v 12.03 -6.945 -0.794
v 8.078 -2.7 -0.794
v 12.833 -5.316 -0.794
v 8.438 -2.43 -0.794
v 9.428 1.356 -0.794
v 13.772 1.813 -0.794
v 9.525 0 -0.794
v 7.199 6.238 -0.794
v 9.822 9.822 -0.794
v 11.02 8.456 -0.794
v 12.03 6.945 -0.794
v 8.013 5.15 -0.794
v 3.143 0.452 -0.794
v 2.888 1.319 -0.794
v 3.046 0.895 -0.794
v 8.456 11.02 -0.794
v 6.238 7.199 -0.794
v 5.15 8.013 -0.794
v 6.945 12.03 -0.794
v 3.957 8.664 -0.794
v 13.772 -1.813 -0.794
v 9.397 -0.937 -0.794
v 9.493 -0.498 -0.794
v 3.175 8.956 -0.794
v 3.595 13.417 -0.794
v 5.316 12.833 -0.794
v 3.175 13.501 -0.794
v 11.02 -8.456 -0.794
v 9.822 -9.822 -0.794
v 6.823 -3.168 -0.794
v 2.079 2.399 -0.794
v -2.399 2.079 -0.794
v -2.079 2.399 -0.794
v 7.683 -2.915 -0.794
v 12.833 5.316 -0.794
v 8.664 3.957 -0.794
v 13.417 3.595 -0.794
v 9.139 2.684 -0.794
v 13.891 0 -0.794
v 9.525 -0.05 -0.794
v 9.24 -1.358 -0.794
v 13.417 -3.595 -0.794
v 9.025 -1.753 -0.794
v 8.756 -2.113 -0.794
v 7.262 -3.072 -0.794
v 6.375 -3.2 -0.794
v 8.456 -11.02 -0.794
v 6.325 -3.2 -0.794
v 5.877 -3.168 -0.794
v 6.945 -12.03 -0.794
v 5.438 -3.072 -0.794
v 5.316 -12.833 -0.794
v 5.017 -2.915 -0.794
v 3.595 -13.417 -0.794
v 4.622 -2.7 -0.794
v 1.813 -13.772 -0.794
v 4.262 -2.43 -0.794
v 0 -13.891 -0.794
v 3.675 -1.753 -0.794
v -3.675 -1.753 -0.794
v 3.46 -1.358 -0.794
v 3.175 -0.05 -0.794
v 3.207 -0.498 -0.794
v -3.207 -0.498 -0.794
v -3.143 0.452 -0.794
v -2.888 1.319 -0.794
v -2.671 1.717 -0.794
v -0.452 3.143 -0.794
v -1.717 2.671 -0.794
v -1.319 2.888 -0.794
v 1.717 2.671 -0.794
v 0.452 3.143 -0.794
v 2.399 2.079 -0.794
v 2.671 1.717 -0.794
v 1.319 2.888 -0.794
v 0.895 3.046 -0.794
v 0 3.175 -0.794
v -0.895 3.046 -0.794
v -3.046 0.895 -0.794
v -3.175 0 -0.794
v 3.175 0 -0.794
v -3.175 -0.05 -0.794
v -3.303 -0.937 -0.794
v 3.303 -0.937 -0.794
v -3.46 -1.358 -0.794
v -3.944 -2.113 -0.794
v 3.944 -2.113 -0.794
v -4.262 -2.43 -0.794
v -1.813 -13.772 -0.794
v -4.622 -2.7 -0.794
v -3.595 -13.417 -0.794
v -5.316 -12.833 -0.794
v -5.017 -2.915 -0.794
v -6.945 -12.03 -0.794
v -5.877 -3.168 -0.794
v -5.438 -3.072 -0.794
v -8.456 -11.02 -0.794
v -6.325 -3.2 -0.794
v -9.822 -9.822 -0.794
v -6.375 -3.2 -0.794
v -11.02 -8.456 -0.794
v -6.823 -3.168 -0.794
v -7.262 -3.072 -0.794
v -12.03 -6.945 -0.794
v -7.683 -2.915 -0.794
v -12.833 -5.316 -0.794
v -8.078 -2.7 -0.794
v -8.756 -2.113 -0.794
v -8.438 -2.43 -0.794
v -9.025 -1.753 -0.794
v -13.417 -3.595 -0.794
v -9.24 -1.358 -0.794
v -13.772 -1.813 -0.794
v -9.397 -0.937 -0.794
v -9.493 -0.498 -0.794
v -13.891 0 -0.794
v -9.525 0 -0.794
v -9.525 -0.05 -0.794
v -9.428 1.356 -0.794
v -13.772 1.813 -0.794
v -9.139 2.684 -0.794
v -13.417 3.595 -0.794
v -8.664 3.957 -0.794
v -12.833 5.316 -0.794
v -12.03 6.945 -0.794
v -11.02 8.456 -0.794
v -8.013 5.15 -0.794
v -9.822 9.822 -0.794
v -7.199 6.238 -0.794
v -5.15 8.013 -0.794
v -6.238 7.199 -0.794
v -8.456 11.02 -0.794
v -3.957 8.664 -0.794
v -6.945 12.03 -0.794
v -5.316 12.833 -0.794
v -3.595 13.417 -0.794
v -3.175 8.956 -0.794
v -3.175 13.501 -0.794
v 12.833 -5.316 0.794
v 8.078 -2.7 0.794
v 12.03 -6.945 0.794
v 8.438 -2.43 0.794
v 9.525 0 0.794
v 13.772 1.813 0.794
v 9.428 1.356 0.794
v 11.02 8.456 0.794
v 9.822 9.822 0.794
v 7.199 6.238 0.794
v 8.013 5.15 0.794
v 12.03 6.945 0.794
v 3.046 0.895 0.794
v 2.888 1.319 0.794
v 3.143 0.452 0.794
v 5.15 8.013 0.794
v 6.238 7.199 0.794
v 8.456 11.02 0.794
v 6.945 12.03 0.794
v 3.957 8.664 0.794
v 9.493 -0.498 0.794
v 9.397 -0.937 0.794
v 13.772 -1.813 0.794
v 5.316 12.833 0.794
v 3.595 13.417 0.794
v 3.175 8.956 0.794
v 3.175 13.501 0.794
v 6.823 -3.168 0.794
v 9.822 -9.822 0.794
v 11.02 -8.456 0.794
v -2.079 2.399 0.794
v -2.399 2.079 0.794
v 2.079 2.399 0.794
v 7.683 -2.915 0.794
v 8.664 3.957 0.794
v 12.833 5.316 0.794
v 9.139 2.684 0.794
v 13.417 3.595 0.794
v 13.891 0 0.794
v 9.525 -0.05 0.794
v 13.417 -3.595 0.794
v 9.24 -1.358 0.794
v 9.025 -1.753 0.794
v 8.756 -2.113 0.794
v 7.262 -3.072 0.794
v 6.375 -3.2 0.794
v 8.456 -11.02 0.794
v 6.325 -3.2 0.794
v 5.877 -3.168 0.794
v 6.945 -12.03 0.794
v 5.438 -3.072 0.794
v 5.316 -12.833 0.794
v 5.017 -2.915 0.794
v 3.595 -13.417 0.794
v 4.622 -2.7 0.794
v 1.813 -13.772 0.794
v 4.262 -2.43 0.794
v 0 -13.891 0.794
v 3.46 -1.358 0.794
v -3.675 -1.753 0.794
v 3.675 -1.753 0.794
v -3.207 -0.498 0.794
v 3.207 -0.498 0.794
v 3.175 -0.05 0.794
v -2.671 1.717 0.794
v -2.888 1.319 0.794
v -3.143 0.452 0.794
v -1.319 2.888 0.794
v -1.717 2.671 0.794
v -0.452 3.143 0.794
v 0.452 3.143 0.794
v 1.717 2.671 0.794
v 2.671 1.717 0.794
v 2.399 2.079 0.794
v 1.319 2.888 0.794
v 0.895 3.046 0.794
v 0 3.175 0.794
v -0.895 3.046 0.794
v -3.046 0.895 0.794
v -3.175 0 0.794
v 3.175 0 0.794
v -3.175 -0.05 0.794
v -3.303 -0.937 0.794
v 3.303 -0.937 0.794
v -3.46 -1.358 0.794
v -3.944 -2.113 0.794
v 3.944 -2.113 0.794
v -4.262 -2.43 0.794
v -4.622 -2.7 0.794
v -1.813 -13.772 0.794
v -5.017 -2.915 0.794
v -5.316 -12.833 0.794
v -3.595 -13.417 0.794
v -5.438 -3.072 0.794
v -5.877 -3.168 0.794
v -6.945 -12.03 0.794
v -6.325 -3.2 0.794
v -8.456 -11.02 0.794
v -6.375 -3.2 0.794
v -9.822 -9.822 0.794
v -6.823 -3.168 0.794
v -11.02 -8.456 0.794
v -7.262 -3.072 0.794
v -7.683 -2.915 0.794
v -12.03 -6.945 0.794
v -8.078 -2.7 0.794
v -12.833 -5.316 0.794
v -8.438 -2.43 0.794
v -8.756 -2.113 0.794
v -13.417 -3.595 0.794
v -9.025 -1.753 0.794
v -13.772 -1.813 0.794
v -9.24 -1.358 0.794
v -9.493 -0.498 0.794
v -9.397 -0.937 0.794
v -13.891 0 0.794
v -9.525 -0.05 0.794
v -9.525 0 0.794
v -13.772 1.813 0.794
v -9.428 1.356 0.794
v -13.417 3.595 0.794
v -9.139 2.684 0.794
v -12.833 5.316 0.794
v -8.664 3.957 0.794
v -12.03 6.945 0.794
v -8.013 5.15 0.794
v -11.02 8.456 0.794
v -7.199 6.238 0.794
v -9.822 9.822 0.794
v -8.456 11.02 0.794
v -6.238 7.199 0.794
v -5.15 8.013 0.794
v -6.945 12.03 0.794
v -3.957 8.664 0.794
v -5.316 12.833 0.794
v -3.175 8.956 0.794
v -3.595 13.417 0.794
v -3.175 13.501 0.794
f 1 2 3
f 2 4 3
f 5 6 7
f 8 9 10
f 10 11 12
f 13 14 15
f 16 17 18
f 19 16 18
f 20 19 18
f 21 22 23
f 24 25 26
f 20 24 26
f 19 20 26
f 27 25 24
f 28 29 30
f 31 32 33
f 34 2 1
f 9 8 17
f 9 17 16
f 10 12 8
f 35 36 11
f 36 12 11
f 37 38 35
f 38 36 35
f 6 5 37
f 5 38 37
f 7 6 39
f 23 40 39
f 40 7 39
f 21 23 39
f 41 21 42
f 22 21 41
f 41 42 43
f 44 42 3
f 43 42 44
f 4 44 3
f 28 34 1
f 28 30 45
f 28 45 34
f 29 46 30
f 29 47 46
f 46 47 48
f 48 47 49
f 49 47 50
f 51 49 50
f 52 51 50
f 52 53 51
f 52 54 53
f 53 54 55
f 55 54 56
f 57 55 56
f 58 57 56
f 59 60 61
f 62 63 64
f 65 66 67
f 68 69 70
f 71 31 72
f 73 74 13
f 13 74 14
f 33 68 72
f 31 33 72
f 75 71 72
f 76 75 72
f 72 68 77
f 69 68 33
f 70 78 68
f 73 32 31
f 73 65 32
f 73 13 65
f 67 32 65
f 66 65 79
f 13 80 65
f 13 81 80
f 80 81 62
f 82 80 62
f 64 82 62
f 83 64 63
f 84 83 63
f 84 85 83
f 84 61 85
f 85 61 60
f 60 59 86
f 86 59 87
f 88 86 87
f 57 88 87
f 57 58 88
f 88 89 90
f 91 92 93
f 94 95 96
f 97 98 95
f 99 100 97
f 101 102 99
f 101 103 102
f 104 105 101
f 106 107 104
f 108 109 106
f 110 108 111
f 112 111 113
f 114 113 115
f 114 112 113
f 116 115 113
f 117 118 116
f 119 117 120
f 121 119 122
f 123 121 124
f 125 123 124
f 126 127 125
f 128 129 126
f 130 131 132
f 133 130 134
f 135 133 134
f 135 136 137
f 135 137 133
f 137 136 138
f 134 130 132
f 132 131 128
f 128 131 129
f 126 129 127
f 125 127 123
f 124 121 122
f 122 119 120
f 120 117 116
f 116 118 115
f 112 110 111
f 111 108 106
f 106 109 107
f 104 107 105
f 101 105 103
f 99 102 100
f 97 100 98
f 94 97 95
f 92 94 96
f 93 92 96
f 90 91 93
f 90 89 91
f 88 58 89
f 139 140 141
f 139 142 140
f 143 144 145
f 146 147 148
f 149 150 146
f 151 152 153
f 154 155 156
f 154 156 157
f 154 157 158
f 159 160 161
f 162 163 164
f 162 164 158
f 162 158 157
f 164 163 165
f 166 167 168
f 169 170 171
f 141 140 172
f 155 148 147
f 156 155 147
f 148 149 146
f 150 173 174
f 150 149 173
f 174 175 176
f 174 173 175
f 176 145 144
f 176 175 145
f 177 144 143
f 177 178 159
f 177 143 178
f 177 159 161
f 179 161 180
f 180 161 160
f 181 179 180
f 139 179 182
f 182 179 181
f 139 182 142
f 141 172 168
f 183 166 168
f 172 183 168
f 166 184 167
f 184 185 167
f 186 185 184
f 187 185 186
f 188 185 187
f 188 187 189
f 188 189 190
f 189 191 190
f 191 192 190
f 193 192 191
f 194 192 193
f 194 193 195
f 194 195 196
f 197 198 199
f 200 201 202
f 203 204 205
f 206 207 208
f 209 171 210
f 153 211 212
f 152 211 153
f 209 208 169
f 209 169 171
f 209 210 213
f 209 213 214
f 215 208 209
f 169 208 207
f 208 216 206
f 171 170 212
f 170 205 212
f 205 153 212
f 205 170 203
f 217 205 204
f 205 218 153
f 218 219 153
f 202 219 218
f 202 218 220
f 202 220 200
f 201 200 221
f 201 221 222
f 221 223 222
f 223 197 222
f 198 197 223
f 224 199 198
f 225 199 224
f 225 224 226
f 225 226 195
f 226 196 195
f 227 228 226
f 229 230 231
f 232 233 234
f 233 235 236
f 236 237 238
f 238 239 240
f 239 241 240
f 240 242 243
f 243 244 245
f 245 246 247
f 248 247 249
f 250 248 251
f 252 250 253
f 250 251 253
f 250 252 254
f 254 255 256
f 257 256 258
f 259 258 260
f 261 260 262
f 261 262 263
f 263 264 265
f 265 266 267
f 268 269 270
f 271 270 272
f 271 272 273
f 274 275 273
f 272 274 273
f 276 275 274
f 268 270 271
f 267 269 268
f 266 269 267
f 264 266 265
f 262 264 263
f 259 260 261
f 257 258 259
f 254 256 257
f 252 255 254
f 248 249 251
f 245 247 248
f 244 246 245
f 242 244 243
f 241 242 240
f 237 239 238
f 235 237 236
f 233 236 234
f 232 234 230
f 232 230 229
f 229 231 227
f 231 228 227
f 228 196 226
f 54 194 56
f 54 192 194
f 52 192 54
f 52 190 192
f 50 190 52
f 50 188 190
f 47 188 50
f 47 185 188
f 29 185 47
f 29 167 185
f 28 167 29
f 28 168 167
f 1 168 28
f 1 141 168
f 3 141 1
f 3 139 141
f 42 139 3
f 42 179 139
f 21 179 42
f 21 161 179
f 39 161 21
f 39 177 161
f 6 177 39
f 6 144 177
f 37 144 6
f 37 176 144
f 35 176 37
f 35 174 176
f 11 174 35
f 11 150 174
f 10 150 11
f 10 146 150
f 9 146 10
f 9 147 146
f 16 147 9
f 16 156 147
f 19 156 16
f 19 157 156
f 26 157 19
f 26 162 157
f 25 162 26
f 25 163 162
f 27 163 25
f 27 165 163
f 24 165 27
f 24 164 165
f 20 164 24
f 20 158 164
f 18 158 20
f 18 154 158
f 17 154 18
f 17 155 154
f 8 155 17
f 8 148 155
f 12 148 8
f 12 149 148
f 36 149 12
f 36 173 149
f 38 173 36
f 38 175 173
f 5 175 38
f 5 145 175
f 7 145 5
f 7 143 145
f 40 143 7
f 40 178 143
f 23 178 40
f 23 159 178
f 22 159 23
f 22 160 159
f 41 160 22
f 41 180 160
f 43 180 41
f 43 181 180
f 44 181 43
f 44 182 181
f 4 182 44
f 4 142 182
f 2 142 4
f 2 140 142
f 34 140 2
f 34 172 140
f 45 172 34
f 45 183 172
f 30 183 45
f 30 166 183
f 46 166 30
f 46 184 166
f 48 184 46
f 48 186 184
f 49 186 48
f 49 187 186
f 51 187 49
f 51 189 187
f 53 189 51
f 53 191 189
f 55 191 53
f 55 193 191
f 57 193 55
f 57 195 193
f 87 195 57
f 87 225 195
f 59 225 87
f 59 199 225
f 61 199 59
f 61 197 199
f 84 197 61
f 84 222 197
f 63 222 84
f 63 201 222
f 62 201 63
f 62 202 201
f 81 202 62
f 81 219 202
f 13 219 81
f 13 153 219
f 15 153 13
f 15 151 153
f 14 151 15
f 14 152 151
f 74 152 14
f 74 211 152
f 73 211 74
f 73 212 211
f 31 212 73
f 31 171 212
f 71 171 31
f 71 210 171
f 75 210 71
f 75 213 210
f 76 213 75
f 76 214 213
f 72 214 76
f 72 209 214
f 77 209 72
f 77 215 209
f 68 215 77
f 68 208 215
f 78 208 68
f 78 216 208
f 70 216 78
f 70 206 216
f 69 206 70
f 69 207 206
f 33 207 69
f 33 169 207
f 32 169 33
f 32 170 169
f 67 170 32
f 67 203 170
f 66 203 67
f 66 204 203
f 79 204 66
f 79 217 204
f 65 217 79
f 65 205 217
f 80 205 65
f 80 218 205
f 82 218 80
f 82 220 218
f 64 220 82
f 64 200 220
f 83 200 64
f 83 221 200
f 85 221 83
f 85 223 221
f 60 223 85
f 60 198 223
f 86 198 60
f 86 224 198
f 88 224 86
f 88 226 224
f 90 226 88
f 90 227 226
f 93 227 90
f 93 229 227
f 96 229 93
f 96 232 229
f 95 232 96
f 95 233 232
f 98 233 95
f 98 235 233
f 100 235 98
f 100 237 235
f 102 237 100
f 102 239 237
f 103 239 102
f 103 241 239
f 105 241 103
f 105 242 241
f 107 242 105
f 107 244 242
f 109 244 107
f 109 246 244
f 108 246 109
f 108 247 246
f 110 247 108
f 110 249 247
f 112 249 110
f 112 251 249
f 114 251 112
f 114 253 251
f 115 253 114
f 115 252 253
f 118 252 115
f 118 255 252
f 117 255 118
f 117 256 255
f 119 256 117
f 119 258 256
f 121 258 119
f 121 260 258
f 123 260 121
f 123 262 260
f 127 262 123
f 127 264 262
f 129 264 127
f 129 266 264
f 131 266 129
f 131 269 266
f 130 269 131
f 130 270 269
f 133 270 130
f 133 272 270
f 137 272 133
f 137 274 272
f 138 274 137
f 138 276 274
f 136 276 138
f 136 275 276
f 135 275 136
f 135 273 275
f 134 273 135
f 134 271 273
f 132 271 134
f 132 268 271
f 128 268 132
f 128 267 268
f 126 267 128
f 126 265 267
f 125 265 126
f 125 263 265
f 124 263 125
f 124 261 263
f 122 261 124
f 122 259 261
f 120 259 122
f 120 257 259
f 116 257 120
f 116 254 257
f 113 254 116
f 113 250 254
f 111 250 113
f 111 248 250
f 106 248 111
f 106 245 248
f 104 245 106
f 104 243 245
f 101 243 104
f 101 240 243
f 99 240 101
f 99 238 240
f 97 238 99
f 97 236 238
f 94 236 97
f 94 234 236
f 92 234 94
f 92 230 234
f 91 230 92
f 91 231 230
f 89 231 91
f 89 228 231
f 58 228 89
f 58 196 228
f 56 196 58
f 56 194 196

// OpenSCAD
// file: ../lib/TOGUnitTable-v1.scad
// TOGUnitTable-v1.1.0 - Library for handling 'complex amounts' in the form of [multiplier, unit name], e.g. [1.5, "inch"]
//
// 2023-07-01: the following 'annotation' is something I just made up,
// but is intended as a way for future packaging tools to know that it's 'safe'
// (because everything has been somewhat namespaced) to turn a `use <x>`
// into an `include <x>`, making it inlinable:
// safe-to-include: true
// 
// Versions:
// v1.0.0:
// - Created it.
// v1.1.0:
// - Add optional 'dbgctxstr' parameter to unit decoding functions, for better error messages
// 
// Naming convention:
// Doing 'OO without classes', here.
// Fully qualified name = class or package name + "__" + member name
// Class or package name may itself be namespaced, and class names may double as package names.
// Here, tog_unittable names both a class and a package.

// Demo unit table uses 'micrometer' as the base unit
// in order to keep multipliers as integers as much as possible.
tog_unittable__demo_unit_table = [
	["um",    [    1   ,   "um"], "micrometer" ],
	["mm",    [ 1000   ,   "um"], "millimeter" ],
	["inch",  [25400   ,   "um"], "inch"       ],
	["u",     [    1/16, "inch"], "model unit" ], // As used by TGx9 et al
	["atom",  [    8   ,    "u"], "model atom" ],
	["chunk", [    3   , "atom"], "model chunk"],
];

use <./DbgCtxStrLib1.scad>

function tog_unittable__list__filter(list, predicate) = [
	for( item=list ) if( predicate(item) ) item
];
function tog_unittable__list__first(list, on_error) =
	len(list) > 0 ? list[0] : on_error();

function tog_unittable__unit_value_ca(unit_table, unit_name, dbgctxstr=undef) =
	tog_unittable__list__first(
		tog_unittable__list__filter(unit_table, function (entry) entry[0] == unit_name),
		function () assert(false,
			str("Did not find entry for unit '", unit_name, "' in unit table", dbgctxstr_errmsg_suffix(dbgctxstr))
		)
	)[1];

function tog_unittable__ca__is_valid( ca ) =
	is_list(ca) && len(ca) == 2;

// Break down 'amount' until it is in a base unit (one which is defined in terms of itself)
function tog_unittable__simplify_ca(unit_table, amount, dbgctxstr=undef) =
	assert( tog_unittable__ca__is_valid(amount), str(amount, " is not a valid Complex Amount (should be [numeric_value, \"unit_name\"])", dbgctxstr=dbgctxstr) )
	let( unit_value_ca = tog_unittable__unit_value_ca(unit_table, amount[1], dbgctxstr=dbgctxstr) )
	unit_value_ca[1] == amount[1] ? amount :
		tog_unittable__simplify_ca(unit_table, [amount[0] * unit_value_ca[0], unit_value_ca[1]]);

function tog_unittable__divide_ca(unit_table, numerator, denominator, dbgctxstr=undef) =
	let(
		numerator_base_ca   = tog_unittable__simplify_ca(unit_table, numerator, dbgctxstr=dbgctxstr),
		denominator_base_ca = tog_unittable__simplify_ca(unit_table, denominator, dbgctxstr=dbgctxstr)
	)
	assert(numerator_base_ca[1] == denominator_base_ca[1], str("Different base units found for ", numerator[1], " and ", denominator[1]))
	numerator_base_ca[0] / denominator_base_ca[0];	

assert(tog_unittable__divide_ca(tog_unittable__demo_unit_table, [1,   "mm"], [  1, "mm"]) ==     1   );
assert(tog_unittable__divide_ca(tog_unittable__demo_unit_table, [1,   "mm"], [  1, "um"]) ==  1000   );
assert(tog_unittable__divide_ca(tog_unittable__demo_unit_table, [1, "inch"], [  1, "um"]) == 25400   );
assert(tog_unittable__divide_ca(tog_unittable__demo_unit_table, [1, "inch"], [  1, "mm"]) ==    25.4 );
assert(tog_unittable__divide_ca(tog_unittable__demo_unit_table, [1, "inch"], [254, "um"]) ==   100   );
assert(tog_unittable__divide_ca(tog_unittable__demo_unit_table, [1,    "u"], [  1, "um"]) ==  1587.5 );
// file: ../lib/TOGComplexLib1.scad
function tcplx1_multiply(a, b) =
	[a[0]*b[0] - a[1]*b[1], a[0]*b[1] + a[1]*b[0]];
function tcplx1_divide(a, b) =
	let(bot = (b[0]*b[0] + b[1]*b[1]))
	[
		(a[0]*b[0] + a[1]*b[1])/bot,
		(a[1]*b[0] - a[0]*b[1])/bot
	];

assert([-11,23] == tcplx1_multiply([3,2], [1,7]));

assert([-1,3] == tcplx1_multiply([3,1], [0,1]));
assert([-1,3] == tcplx1_multiply([0,1], [3,1]));

echo(tcplx1_divide([-1,3], [3,1]));
assert([0,1] == tcplx1_divide([-1,3], [3,1]));

function tcplx1_normalize(vec) =
	let(veclen = sqrt(vec[0]*vec[0]+vec[1]*vec[1]))
	[vec[0] / veclen, vec[1] / veclen];

function tcplx1_relative_turnvec_vv(v0, v1) =
	tcplx1_divide(tcplx1_normalize(v1), tcplx1_normalize(v0));

function tcplx1_relative_turnvec_abc(p0, p1, p2) = tcplx1_relative_turnvec_vv(p1-p0, p2-p1);

// A 90-degree turn
assert([0,1] == tcplx1_relative_turnvec_abc([0,0], [1,0], [1,1]));
assert([0,1] == tcplx1_relative_turnvec_abc([0,0], [0,1], [-1,1]));

// A 45-degree turn
assert(tcplx1_normalize([1,1]) == tcplx1_relative_turnvec_abc([0,0], [1,0], [ 2,1]));
assert(tcplx1_normalize([1,1]) == tcplx1_relative_turnvec_abc([0,0], [0,1], [-1,2]));


function tcplx1_relative_angle_abc(p0, p1, p2) =
	let(turnvec = tcplx1_relative_turnvec_abc(p0, p1, p2))
	atan2(turnvec[1], turnvec[0]);

assert(-135 == tcplx1_relative_angle_abc([0,0], [1,0], [0,-1]));
assert( -90 == tcplx1_relative_angle_abc([0,0], [1,0], [1,-1]));
assert(   0 == tcplx1_relative_angle_abc([0,0], [1,0], [2, 0]));
assert(  90 == tcplx1_relative_angle_abc([0,0], [1,0], [1, 1]));
assert( 135 == tcplx1_relative_angle_abc([0,0], [1,0], [0, 1]));

assert(  90 == tcplx1_relative_angle_abc([1,1], [3,3], [1, 5]));
// file: ../lib/TOGArrayLib1.scad
// TOGArrayLib1.5
// 
// Functions for working with arrays.
// 
// v1.1:
// - tal1_reduce assert(is_list(items)) to prevent infinite recursion
//   when given undefined or other non-list values
// v1.1.1:
// - Fix tal1_uniq_remap_v2 to return "list-remap-result" as the
//   first element of the returned list
// v1.2:
// - Add tal1_replace_at function
// v1.3:
// - tal1_is_vec_of, tal1_is_vec_of_num
// v1.4:
// - tal1_assert_for_each, for when you want to assert something
//   about each of a list of items and get nice failure messages
// v1.5:
// - Add tal1_duplicate_reversed function, which may be
//   handy when generating symmetrical polygons and stuff.

/**
 * Make a list with the contents of list `a`,
 * but starting at offset `off`, replaced by the contents of list `b`.
 * len(result) = max(len(a), off+len(b))
 */
function tal1_replace_at(a, off, b, default_value=undef, default_value_function=undef) =
	assert(is_list(a))
	assert(is_list(b))
	let( _dvf = !is_undef(default_value_function) ? default_value_function : function(i) default_value )
[
	for( i=[0:1:min(off,len(a))-1] ) a[i],
	for( i=[len(a):1:off-1] ) _dvf(i),
	for( i=[off:1:off+len(b)-1] ) b[i-off],
	for( i=[off+len(b):1:len(a)-1] ) a[i],
];

// Simplest case
assert([] == tal1_replace_at([], 0, []));
// Second simplest cases
assert(["foo"] == tal1_replace_at(["foo"], 0, []));
assert(["foo"] == tal1_replace_at([], 0, ["foo"]));
// Replace one item
assert(["foo","quux","baz"] == tal1_replace_at(["foo","bar","baz"], 1, ["quux"]));
// Replace and extend
assert(["foo","quux","tuna","tina"] == tal1_replace_at(["foo","bar","baz"], 1, ["quux", "tuna", "tina"]));
// Add beyond end of `a`
assert(["foo","zzz","quux"] == tal1_replace_at(["foo"], 2, ["quux"], default_value="zzz"));
// Adding 'nothing' should still fill to that point with defaults
assert(["foo","zzz","zzz"] == tal1_replace_at(["foo"], 3, [], default_value="zzz"));


function tal1_reduce(start, items, func, offset=0) =
	assert(is_list(items))
	len(items) == offset ? start :
	tal1_reduce(func(start, items[offset]), items, func, offset+1);

function tal1_consecutive_duplicate_count(items) = tal1_reduce(
	[0, undef],
	items,
	function(z,item) [z[0] + (item == z[1] ? 1 : 0), item]
)[0];

assert(0 == tal1_consecutive_duplicate_count([]));
assert(0 == tal1_consecutive_duplicate_count([50]));
assert(1 == tal1_consecutive_duplicate_count([50,50]));
assert(0 == tal1_consecutive_duplicate_count([50,51,52,53]));
assert(1 == tal1_consecutive_duplicate_count([50,51,52,52]));
assert(3 == tal1_consecutive_duplicate_count([50,50,50,50]));

// Set test_size to arbirarily large values
// to ensure that OpenSCAD can handle heavy recursion
let(test_size=1000) assert(test_size/2 == tal1_consecutive_duplicate_count([for(i=[0:1:test_size-1]) floor(i/2)]));



function tal1_uniq_(items, off0, off1) =
	let(chunklen = off1-off0)
	chunklen == 0 ? [] :
	chunklen == 1 ? [items[off0]] :
	let(half=floor(chunklen/2))
	let(left  = tal1_uniq_(items, off0     , off0+half))
	let(right = tal1_uniq_(items, off0+half, off1     ))
	assert(len(left) > 0)
	assert(len(right) > 0)
	left[len(left)-1] == right[0] ? [each left, for(i=[1:1:len(right)-1]) right[i]] :
	[each left, each right];

/** Given a list of items, returns a new list with identical consecutive items merged */
function tal1_uniq(items) = tal1_uniq_(items, 0, len(items));

assert([] == tal1_uniq([]));
assert([123] == tal1_uniq([123]));
assert([55,0,1,2,3] == tal1_uniq([55,0,1,2,3]));
assert([55,0,1,2] == tal1_uniq([55,0,1,1,2]));
assert([55,0,1] == tal1_uniq([55,55,0,0,0,0,0,0,1,1,1,1]));
assert([55,0] == tal1_uniq([55,0,0,0,0,0,0,0]));



/**
 * Returns [new items, old index -> new index mapping].
 * No-op version.
 */
function tal1_uniq_remap_v1(items) =
	["list-remap-result", items, [for (vi=[0:1:len(items)-1]) vi]];

// [a, a, b, b, c, c]
//
// [a,    ...], []  -> [a],[0]
// [a, a, ...], [0] -> [a],[0,0]

assert([1,2,3] == [1,2,3]);

/**
 * Recursive version that will combine adjacent identical vertexes,
 * but will use the original items.
 */
function tal1_uniq_remap_v2(items, map=[]) =
	let(index = len(map))
	len(items) == index ? ["list-remap-result", items, map] :
	index == 0 ? tal1_uniq_remap_v2(items, [0]) :
	items[index] == items[map[index-1]] ? tal1_uniq_remap_v2(items, [for(vi=map) vi, map[index-1]]) :
	tal1_uniq_remap_v2(items, [for(vi=map) vi, index]);

assert(tal1_uniq_remap_v2([1,1,2,2,3,4]) == ["list-remap-result", [1,1,2,2,3,4], [0,0,2,2,4,5]]);


/**
 * Returns true if `vec` is a list of at least min_len items
 * and component_check(each item, even those beyond min_len) is true.
 */
function tal1_is_vec_of(vec, min_len=0, component_check=function(x) true) =
	assert(is_num(min_len) && min_len >= 0)
	assert(is_function(component_check))
	is_list(vec) && len(vec) >= min_len &&
	tal1_reduce(true, vec, function(prev,item) prev && component_check(item));

function tal1_is_vec_of_num(vec, min_len=0) = tal1_is_vec_of(vec, min_len, function(i) is_num(i));

assert( true == tal1_is_vec_of_num([1,2,3]));
assert( true == tal1_is_vec_of_num([]));
assert( true == tal1_is_vec_of_num([1,2,3], 3));
assert(false == tal1_is_vec_of_num([1,2], 3));
assert(false == tal1_is_vec_of_num([1,2,"spoon"], 3));
// Requirements are ambiguous when
// first min_len items are numbers, but there are non-numeric items afterwards,
// so let's error on the side of saying 'no, it's not a list of numbers';
// i.e. the item check and the min_len are independent.
assert(false == tal1_is_vec_of_num([1,2,3,"artichoke"], 3));


/**
 * Asserts that item_checker(each item in list, index of item)[0] is true.
 * Second element of item_checker return value is assertion message.
 * Returns the original list, in case that's useful to you.
 */
function tal1_assert_for_each(list, item_checker) =
	let( _ignored = [ for(i=[0:1:len(list)-1])
		let(q=item_checker(list[i],i))
		let(passed=is_bool(q) ? q : is_list(q) ? q[0] : assert(false, str(
			"tal1_assert_for_each: item_checker should return Bool|[Bool,String], but returned ",
			q, " for item at index ", i)))
		let(message=is_list(q) ? q[1] : undef)
		assert(passed, message)
		q
	])
	list;

// Callback can return a boolean...
assert([1,2,3] == tal1_assert_for_each([1,2,3], function(v,i) is_num(v)));
// ...or a [boolean, string]
assert([1,2,3] == tal1_assert_for_each([1,2,3], function(v,i) [is_num(v), "element be a num"]));

// [a, b, c] -> [a, b, c, rxf(c), rxf(b), rxf(a)]
function tal1_duplicate_reversed(list, rxf=function(item) item) =
	[
		each list,
		for( i=[len(list)-1 : -1 : 0] ) rxf(list[i]),
	];
// file: ../lib/TOGStringLib1.scad
// TOGStringLib1.7
// 
// Functions for parsing quantities
// and other misc. string handling.
// 
// v1.5
// - togstr1_parse_quantity will treat unit-only strings as meaning 1/1 of that unit.
//   e.g. togstr1_parse_quantity("foot") = [[[1,1], "foot", 4]]
// v1.6:
// - togstr1_parse_quantity allows unit name to be omitted when quantity is zero and $togunits1_default_unit is defined
// v1.7:
// - Add optional 'dbgctxstr' parameter to unit decoding functions, for better error messages
// 
// Globals: $togunits1_default_unit - affects what 'unit' is returned
// when interpreting numbers or strings that lack the unit.


function togstr1__todo(message) = assert(false, str("TODO: ", message));

module togstr1__assert_eq(a, b) {
	if( a != b ) {
		assert( a == b, str(a, " != ", b) );
	}
}



function togstr1_slice(source, i0, i1) =
	i0 == i1 ? "" :
	str(source[i0], togstr1_slice(source, i0+1, i1));

function togstr1_tokenize(source, sep, maxcount=9999, i=0, tokenstart=0) =
	len(source) == i ? (
		(tokenstart < i) ? [togstr1_slice(source, tokenstart, i)] : []
	) :
	source[i] == sep ? (
		(tokenstart < i) ? concat([togstr1_slice(source, tokenstart, i)], togstr1_tokenize(source, sep, maxcount-1, i+1, i+1)) :
		togstr1_tokenize(source, sep, maxcount, i+1, i+1)
	) :
	maxcount <= 1 ? [togstr1_slice(source, tokenstart, len(source))] :
	togstr1_tokenize(source, sep, maxcount, i+1, tokenstart);

togstr1__assert_eq( ["foo","bar","baz"], togstr1_tokenize("foo-bar-baz", "-") );
// Duplicate delimiters are ignored
togstr1__assert_eq( ["foo","bar","baz"], togstr1_tokenize("foo--bar--baz", "-") );
// Trailing delimiters are ignored
togstr1__assert_eq( ["foo","bar","baz"], togstr1_tokenize("foo--bar--baz--", "-") );
// Leading delimiters are ignored
togstr1__assert_eq( ["foo","bar","baz"], togstr1_tokenize("--foo--bar--baz", "-") );
// Can limit number of tokens returned
togstr1__assert_eq( ["foo","bar-baz"], togstr1_tokenize("foo-bar-baz", "-", 2) );
togstr1__assert_eq( ["foo","bar-baz"], togstr1_tokenize("--foo--bar-baz", "-", 2) );
togstr1__assert_eq( ["foo","bar--baz"], togstr1_tokenize("--foo--bar--baz", "-", 2) );
togstr1__assert_eq( ["foo"], togstr1_tokenize("--foo--", "-", 2) );




/** \d+ -> [num, end_index] */
function togstr1_parse_decimal_nat(str, index=0, current=0, dbgctxstr=undef) =
	len(str) == index ? [current, index] :
	let( dig = ord(str[index]) - ord("0") )
	(dig >= 0 && dig <= 9) ? togstr1_parse_decimal_nat(str, index+1, current*10 + dig, dbgctxstr=dbgctxstr) :
	[current, index];

togstr1__assert_eq( [123,3], togstr1_parse_decimal_nat("123") );
togstr1__assert_eq( [123,3], togstr1_parse_decimal_nat("123.45") );

/** [+-]*\d+ ->  [[num, den], end_index] */
function togstr1_parse_decimal_number(str, index=0, dbgctxstr=undef) =
	str[index] == "+" ? togstr1_parse_decimal_number(str, index+1) :
	str[index] == "-" ? let(r=togstr1_parse_decimal_number(str, index+1)) [[-r[0][0], r[0][1]], r[1]] :
	let(r = togstr1_parse_decimal_nat(str, index, dbgctxstr=dbgctxstr))
	str[r[1]] != "." ? [[r[0], 1], r[1]] :
	let(fracr = togstr1_parse_decimal_nat(str, r[1]+1))
	let(mult = pow(10, fracr[1]-(r[1]+1)))
	[[r[0]*mult + fracr[0], mult], fracr[1]];

togstr1__assert_eq( [[   36,   1], 2], togstr1_parse_decimal_number( "36"   ) );
togstr1__assert_eq( [[ 3524, 100], 5], togstr1_parse_decimal_number( "35.24") );
togstr1__assert_eq( [[-3524, 100], 6], togstr1_parse_decimal_number("-35.24") );
togstr1__assert_eq( [[    0,   1], 0], togstr1_parse_decimal_number( "NotANumber") );

function togstr1__gcd(a, b) = b == 0 ? abs(a) : togstr1__gcd(b, a % b);

togstr1__assert_eq(10, togstr1__gcd(10, 20));
togstr1__assert_eq( 5, togstr1__gcd(10, 15));
togstr1__assert_eq( 2, togstr1__gcd(10, 14));


function togstr1__normalize_rat(rat) =
	let(gcd = togstr1__gcd(rat[0], rat[1]))
	// TODO: find LCD, divide top and bottom by it
	rat[0] < 0 && rat[1] < 0 ? [-rat[0]/gcd, -rat[1]/gcd] :
	[rat[0]/gcd, rat[1]/gcd];

/** <decnum>[/<decnum>] -> [[num, den], end_index] */
function togstr1__multiply_rat(a, b) =
	togstr1__normalize_rat(
		a[1] == b[1] ? [a[0]*b[0]/a[1], a[1]] : // TODO: LCD instead of special case
		[a[0]*b[0], a[1]*b[1]]
	);
function togstr1__divide_rat(a, b) = togstr1__normalize_rat([a[0]*b[1], a[1]*b[0]]);


function togstr1__add_rat(a, b) =
	togstr1__normalize_rat([a[0]*b[1] + b[0]*a[1], a[1]*b[1]]);
	
togstr1__assert_eq([1, 2], togstr1__add_rat([1, 3], [1, 6]));


/** Return [[num, den], end_index] */
function togstr1_parse_rational_number(str, index=0, dbgctxstr=undef) =
	let( numr = togstr1_parse_decimal_number(str, index, dbgctxstr=dbgctxstr) )
	str[numr[1]] == "+" ?
		let(numrb = togstr1_parse_rational_number(str, numr[1]+1, dbgctxstr=dbgctxstr))
		[togstr1__add_rat(numr[0], numrb[0]), numrb[1]]	:
	str[numr[1]] == "/" ?
		let( denr = togstr1_parse_decimal_number(str, numr[1]+1, dbgctxstr=dbgctxstr) )
		[togstr1__divide_rat(numr[0], denr[0]), denr[1]] :
	numr;

togstr1__assert_eq( [[   123,  1],3], togstr1_parse_rational_number( "123") );
togstr1__assert_eq( [[   123,  1],4], togstr1_parse_rational_number("+123") );
togstr1__assert_eq( [[-  123,  1],4], togstr1_parse_rational_number("-123") );
togstr1__assert_eq( [[   123,  1],6], togstr1_parse_rational_number("-+-123") );
togstr1__assert_eq( [[ 12345,100],6], togstr1_parse_rational_number("123.45") );
togstr1__assert_eq( [[  2469, 40],8], togstr1_parse_rational_number("123.45/2") );
togstr1__assert_eq( [[-  823,160],10], togstr1_parse_rational_number("-123.45/24") );
togstr1__assert_eq( [[     4,  3],5], togstr1_parse_rational_number( "1+1/3") );
togstr1__assert_eq( [[     0,  1],0], togstr1_parse_rational_number( "NotANumber!!") );


/** Return [[[num, den], unit], end_index] */
function togstr1_parse_quantity(str, dbgctxstr=undef) =
	let( numr = togstr1_parse_rational_number(str, dbgctxstr=dbgctxstr) )
	// For now, just let the unit be the rest of the string;
	// can revisit to stop at delimiters if needed in the future.
	numr[1] > 0 && numr[1] == len(str) && numr[0][0] == 0 && !is_undef($togunits1_default_unit) ? [[[0,1], $togunits1_default_unit], numr[1]] :
	assert( numr[1] < len(str), str("Quantity string missing unit: '", str, "'; note that '0' is acceptable if $togunits1_default_unit is defined"))
	let( unit = togstr1_slice(str, numr[1], len(str)) )
	let( quant = numr[1] > 0 ? numr[0] : [1,1] ) // No number = 1 (possibly this should be an error instead)
	[[quant, unit], len(str)];

togstr1__assert_eq( [[[  3,  1], "acre"],  5], togstr1_parse_quantity("3acre") );
togstr1__assert_eq( [[[  3,  5], "acre"],  7], togstr1_parse_quantity("3/5acre") );
togstr1__assert_eq( [[[301,500], "acre"], 10], togstr1_parse_quantity("3.01/5acre") );
togstr1__assert_eq( [[[  1,  1], "acre"],  4], togstr1_parse_quantity("acre") ); // Should either treat as one or throw an error!
togstr1__assert_eq( [[[  0,  1],"hectare"],1], togstr1_parse_quantity("0", $togunits1_default_unit="hectare") ); // Zero is fine if $togunits1_default_unit is defined
// file: ../lib/TOGridLib3.scad
// TOGridPileLib-v3.4
// 
// HOKAY WHAT ARE THE COMMON
// things that I want the library to do?
// 
// - [X] Be `include`-able, to make inlining easy
// - [X] Allow unit table to be overridden easily, but default by default
// - [ ] Support common configurations by name (e.g. "V9", or some "WSTYPE-...")
//   without having to pass 50 different parameters in
// - [ ] Support subtractions for those common configurations also,
//   such that you don't need to remember to 'do less rounding', etc.
// - [ ] Make a simple foot-only block that I can subtract stuff from
//   params: foot style
// - [ ] Make a block with a lip
// - [ ] Make a block foot, and I'll intersect it with some other things
// - [X] Translate a block_size_ca to mm
// 
// Changes:
// v3.1:
// - s/togridpile3_decode_size/togridpile3_decode_vector/
// v3.2:
// - togridpile3_decode(num) = num
// v3.3:
// - Change prefix from `togridpile3` to `togridlib3`
// v3.4:
// - Add optional 'dbgctxstr' parameter to unit decoding functions, for better error messages

use <../lib/TOGUnitTable-v1.scad>

function togridlib3_map(arr, fn) = [ for(item=arr) fn(item) ];

togridlib3_default_unit_table = [
	["um",    [    1,               "um"]],
	["mm",    [ 1000,               "um"]],
	["inch",  [25400,               "um"]],
	["u",     [    1.5875,          "mm"]],
	["atom",  [    8,                "u"]],
	["chunk", [    3,             "atom"]],
	["tgp-standard-bevel"   , [2,    "u"]], // Usuually 1/8"
	["m-outer-corner-radius", [4,    "u"]],
	["f-outer-corner-radius", [3,    "u"]],
];

function togridlib3_get_default_unit_table() = togridlib3_default_unit_table;
function togridlib3_get_unit_table() = is_undef($togridlib3_unit_table) ? togridlib3_default_unit_table : $togridlib3_unit_table;

function togridlib3_decode(dim, unit=[1, "mm"], unit_table=togridlib3_get_unit_table(), dbgctxstr=undef) =
	is_num(dim) ? dim : tog_unittable__divide_ca(unit_table, dim, unit, dbgctxstr=dbgctxstr);
function togridlib3_decode_vector(size, unit=[1, "mm"], unit_table=togridlib3_get_unit_table(), dbgctxstr=undef) =
	togridlib3_map(size, function(dim) is_num(dim) ? dim : tog_unittable__divide_ca(unit_table, dim, unit, dbgctxstr=dbgctxstr));

module togridlib3_cube(size, offset=0) {
	cube(togridlib3_decode_vector(size), center=true);
}
// file: ../lib/DbgCtxStrLib1.scad
// DbgCtxStrLib1.0
// 
// Library for dealing with 'debug context strings' (usually 'dbgctxstr').

function dbgctxstr_errmsg_suffix(dbgctxstr) =
	is_undef(dbgctxstr) || dbgctxstr == "" ? "" :
	str(" (", dbgctxstr, ")");
// file: ../lib/TOGMod1Constructors.scad
// TOGMod1Constructors-v1.11
// 
// Functions to construct objects understood by TOGMod1
// 
// v1.1:
// - Add togmod1_make_rounded_rect
// v1.2:
// - togmod1_make_rounded_rect can make ovals
// v1.3:
// - togmod1_circle_points, to just get the points of a circle
// - if pos parameter to circle function has a third element,
//   returned vertexes will include it as the z component;
// v1.3.1
// - Some assertions
// v1.4:
// - Refactor togmod1_rounded_rect_points and togmod1_circle_points
//   to use togmod1__make_nd_vector_adder for adapting to whatever
//   `pos` parameter is.
// v1.5:
// - togmod_rounded_rect_points will not simplify completely rounded sides
//   (where length of side is exactly twice the rounding radius)
//   unless simplify_rounded_sides=true
//   - This makes it more useful for polyhedron generation,
//     where radius varies, but number of points must remain constant.
// v1.6:
// - togmod1_make_rect makes a simple rectangle
// - togmod1_make_rounded_rect will defer to togmod1_make_rect when r=0
// v1.7:
// - togmod1_make_circle will return empty shape (["union"]) when d=0
// v1.8:
// - Add togmod1_text
// v1.9:
// - togmod1_circle_points uses 3 as minimum circle point count instead of 6
// v1.10:
// - Fix togmod1_linear_extrude_y so that range corresponds to Y start/end and
//   polygon X,Y correspond to X,Z.  Previously it was rotated wrongly,
//   which would have gone unnoticed for symmetrical shapes centered at 0,0.
// v1.11:
// - Remove an 'echo'

use <./TOGArrayLib1.scad>

function togmod1__make_nd_vector_adder(origin=[0,0]) =
	let(origin_is_zero = tal1_reduce(true, origin, function(prev,item) prev && item == 0))
	origin_is_zero ? (function(vec) len(vec) >= len(origin) ? vec : tal1_replace_at(origin, 0, vec)) :
	function(vec) [
		for(i=[0:1:max(len(origin),len(vec))-1]) (len(vec) > i ? vec[i] : 0) + (len(origin) > i ? origin[i] : 0),
	];

assert([1,2,3] == togmod1__make_nd_vector_adder()([1,2,3]));
assert([1,2,3] == togmod1__make_nd_vector_adder([0,0,3])([1,2]));


function togmod1_make_cuboid(size) =
	assert(is_list(size))
	assert(len(size) >= 3)
	assert(is_num(size[0]))
	assert(is_num(size[1]))
	assert(is_num(size[2]))
	["polyhedron-vf", [
		[-size[0]/2, -size[1]/2, -size[2]/2],
		[+size[0]/2, -size[1]/2, -size[2]/2],
		[-size[0]/2, +size[1]/2, -size[2]/2],
		[+size[0]/2, +size[1]/2, -size[2]/2],
		[-size[0]/2, -size[1]/2, +size[2]/2],
		[+size[0]/2, -size[1]/2, +size[2]/2],
		[-size[0]/2, +size[1]/2, +size[2]/2],
		[+size[0]/2, +size[1]/2, +size[2]/2]
	], [
		[0,1,3,2],[0,4,5,1],[4,6,7,5],[3,7,6,2],[1,5,7,3],[6,4,0,2]
	]];

function togmod1_make_polygon(verts) =
	["polygon-vp", verts, [[for( i=[0:1:len(verts)-1] ) i%len(verts)]]];

function togmod1_rounded_rect_points(size, r, pos=[0,0], simplify_rounded_sides=false) =
	assert(is_list(size))
	assert(len(size) >= 2)
	let(radii = is_list(r) ? r : is_num(r) ? [r,r] : assert(false, "rounded_rect r(adius) should be list<num> or num"))
	let(rx = radii[0])
	let(ry = radii[1])
	assert(is_num(rx))
	assert(is_num(ry))
	assert(size[0] >= 2*rx, str("size[0] must be >= 2*r[0]; size[0] = ",size[0],", 2*r[0] = ",2*rx))
	assert(size[1] >= 2*ry, str("size[1] must be >= 2*r[1]; size[1] = ",size[1],", 2*r[1] = ",2*ry))
	let(quarterfn=max($fn/4, 1))
	let(qfnx = simplify_rounded_sides && size[0] == 2*rx ? quarterfn-1 : quarterfn)
	let(qfny = simplify_rounded_sides && size[1] == 2*ry ? quarterfn-1 : quarterfn)
	let(finalizepos = togmod1__make_nd_vector_adder(pos))
[
	for(a=[0 : 1 : qfnx]) let(ang=      a*90/quarterfn) finalizepos([ size[0]/2-rx + rx*cos(ang),  size[1]/2-ry + ry*sin(ang)]),
	for(a=[0 : 1 : qfny]) let(ang= 90 + a*90/quarterfn) finalizepos([-size[0]/2+rx + rx*cos(ang),  size[1]/2-ry + ry*sin(ang)]),
	for(a=[0 : 1 : qfnx]) let(ang=180 + a*90/quarterfn) finalizepos([-size[0]/2+rx + rx*cos(ang), -size[1]/2+ry + ry*sin(ang)]),
	for(a=[0 : 1 : qfny]) let(ang=270 + a*90/quarterfn) finalizepos([ size[0]/2-rx + rx*cos(ang), -size[1]/2+ry + ry*sin(ang)]),
];

function togmod1_make_rect(size) =
	togmod1_make_polygon([
		[-size[0]/2, -size[1]/2],
		[+size[0]/2, -size[1]/2],
		[+size[0]/2, +size[1]/2],
		[-size[0]/2, +size[1]/2],
	]);

function togmod1_make_rounded_rect(size, r) =
	r == 0 ? togmod1_make_rect(size) :
	togmod1_make_polygon(togmod1_rounded_rect_points(size,r,simplify_rounded_sides=true));

/**
 * Returns points for an approximation of a circle where points are at distance r from pos.
 * Can be used to make other regular polygons, but the faces will be less than that
 * distance from pos (do some trig if you want face distance, e.g. for a hex nut).
 */
function togmod1_circle_points(r, pos=[0,0], d=undef) =
	assert( !is_undef(r) || !is_undef(d) )
	assert(!is_undef(pos[0]))
	assert(!is_undef(pos[1]))
	let(finalizepos = togmod1__make_nd_vector_adder(pos))
	let(r_ = !is_undef(r) ? r : d/2)
	let(fn = max($fn, 3))
	[for(i=[0 : 1 : fn-1]) finalizepos([r_*cos(i*360/fn), r_*sin(i*360/fn)])];

function togmod1_make_circle(r, pos=[0,0], d=undef) =
	r == 0 || d == 0 ? ["union"] :
	togmod1_make_polygon(togmod1_circle_points(r=r, pos=pos, d=d));

function togmod1_make_cylinder(d, zrange=[0,1], r=undef, pos=[0,0]) =
	assert( !is_undef(r) || !is_undef(d) )
	let( r_ = !is_undef(r) ? r : d/2 )
	// TODO: Make polyhedron directly
	["linear-extrude-zs", zrange, togmod1_make_circle(r=r_, pos=pos)];

function togmod1__is_range1d(range) = is_list(range) && len(range) == 2 && is_num(range[0]) && is_num(range[1]);

function togmod1_linear_extrude_z(range, shape) =
	assert(togmod1__is_range1d(range))
	["linear-extrude-zs", range, shape];
function togmod1_linear_extrude_x(range, shape) =
	assert(togmod1__is_range1d(range))
	["rotate", [90, 0, 90], togmod1_linear_extrude_z(range, shape)];
function togmod1_linear_extrude_y(range, shape) =
	assert(togmod1__is_range1d(range))
	["rotate", [90, 0,  0], togmod1_linear_extrude_z([-range[1], -range[0]], shape)];

function togmod1_text(text, size, font, halign, valign, spacing, direction, language, script) =
	["text-tsfhvsdls", text, size, font, halign, valign, spacing, direction, language, script];
// file: ../lib/TOGMod1.scad
// TOGMod1.9
// OpenSCAD library for representing shapes
// 
// See also: Functional OpenSCAD (https://github.com/thehans/FunctionalOpenSCAD)
// 
// v1.8:
// - Add `text-tsfhvsdls`
// v1.9
// - Add `offset-ds` (offset with _d_elta a _s_hape)

module togmod1_domodule(mod) {
	assert(is_list(mod));
	assert(len(mod) > 0);
	if( mod[0] == "polygon-vp" ) {
		// ["polygon-vp", vertexes, paths]
		polygon(points=mod[1], paths=mod[2]);
	} else if( mod[0] == "polyhedron-vf" ) {
		polyhedron(mod[1], faces=mod[2]);
	} else if( mod[0] == "scale" ) {
		assert(len(mod) == 3);
		scale(mod[1]) togmod1_domodule(mod[2]);
	} else if( mod[0] == "translate" ) {
		assert(len(mod) == 3);
		assert(is_list(mod[1]));
		for(c=mod[1]) assert(is_num(c), "translate component should be numeric");
		translate(mod[1]) togmod1_domodule(mod[2]);
	} else if( mod[0] == "rotate" ) {
		assert(len(mod) == 3);
		rotate(mod[1]) togmod1_domodule(mod[2]);
	} else if( mod[0] == "intersection" ) {
		intersection_for( i=[1:1:len(mod)-1] ) togmod1_domodule(mod[i]);
	} else if( mod[0] == "difference" ) {
		difference() {
			togmod1_domodule(mod[1]);
			for( i=[2:1:len(mod)-1] ) togmod1_domodule(mod[i]);
		}
	} else if( mod[0] == "union" ) {
		for( i=[1:1:len(mod)-1] ) togmod1_domodule(mod[i]);
	} else if( mod[0] == "hull" ) {
		hull() for( i=[1:1:len(mod)-1] ) togmod1_domodule(mod[i]);
	} else if( mod[0] == "offset-rs" ) {
		assert(len(mod) == 3);
		assert(is_num(mod[1]));
		assert(is_list(mod[2]));
		offset(mod[1]) togmod1_domodule(mod[2]);
	} else if( mod[0] == "linear-extrude-zs" ) {
		// ["linear-extrude-zs", [z0,z1], 2d_shape] // centered
		// ["linear-extrude-zs", height, 2d_shape]
		let( zrange = is_list(mod[1]) ? mod[1] : [-mod[1]/2, mod[1]/2] ) {
			translate([0,0,zrange[0]]) linear_extrude(zrange[1]-zrange[0]) togmod1_domodule(mod[2]);
		}
	} else if( mod[0] == "render" ) {
		render() togmod1_domodule(mod[1]);
	} else if( mod[0] == "minkowski" ) {
		minkowski() {
			togmod1_domodule(mod[1]);
			togmod1_domodule(mod[2]);
		}
	} else if( mod[0] == "x-debug" ) {
		# togmod1_domodule(mod[1]);
	} else if( mod[0] == "x-color" ) {
		color(mod[1]) togmod1_domodule(mod[2]);
	} else if( mod[0] == "text-tsfhvsdls" ) {
		text(text=mod[1], size=mod[2], font=mod[3], halign=mod[4], valign=mod[5], spacing=mod[6], direction=mod[7], language=mod[7], script=mod[8]);
	} else if( mod[0] == "offset-ds" ) {
		assert(is_num(mod[1]));
		assert(is_list(mod[2]));
		offset(delta=mod[1]) togmod1_domodule(mod[2]);
	} else {
		assert(false, str("Unrecognized shape: ", mod[0]));
	}
}
// file: ../lib/TOGUnits1.scad
// TOGUnits1.7
// 
// For simlifying quantity parsing and unit conversion
// 
// v1.1:
// - Add `togunits1_decode` function
// v1.2:
// - Add togunits1_decode_vec
// v1.3:
// - Add togunits1_vec_to_cas
// v1.4:
// - Add togunits1_vec_to_mms
// v1.5:
// - Remove unused `unit` parameter from `togunits1_vec_to_cas`
// v1.6:
// - togunits1_decode accepts `xf` parameter, same as togunits1_decode_vec
// v1.7:
// - Add optional 'dbgctxstr' parameter to unit decoding functions, for better error messages
// 
// Reserved but not-yet-actually-used globals:
// - $togunits1_default_unit - default unit when interpreting "0"
//   - See TOGStringLib1
// - $togunits1_default_implied_unit - when interpreting quantities without unit, assume they have this one
//   - This might be a bad idea, so never implemented!

use <./DbgCtxStrLib1.scad>
use <./TOGridLib3.scad>
use <./TOGStringLib1.scad>

function togunits1__is_ca(what) =
	is_list(what) && len(what) == 2 && is_num(what[0]) && is_string(what[1]);

function togunits1__parse_to_ca(what, dbgctxstr=undef) =
	assert( is_string(what) )
	let( parseresult = togstr1_parse_quantity(what, dbgctxstr) )
	assert( parseresult[1] > 0, str("Failed to parse quantity from  ", what, dbgctxstr=dbgctxstr) )
	let( parsed = parseresult[0] )
	let( rat = parsed[0] )
	let( unit = parsed[1] )
	[rat[0]/rat[1], unit];

function togunits1_to_ca(what, dbgctxstr=undef) =
	is_string(what) ? togunits1__parse_to_ca(what, dbgctxstr=dbgctxstr) :
	togunits1__is_ca(what) ? what :
	is_num(what) ? [what, "mm"] :
	assert(false, str("Unrecognized quantity representation: ", what));

function togunits1_vec_to_cas(whats) =
	[for(w=whats) togunits1_to_ca(w)];

function togunits1__get_transform(name) =
	is_function(name) ? name :
	is_undef(name) ? function(n) n :
	name == "round" ? function(n) round(n) :
	name == "ceil" ? function(n) ceil(n) :
	assert(false, str("Unrecognized transform: '", name, "'"));

function togunits1_decode(what, unit=[1,"mm"], xf=undef, dbgctxstr=undef) =
	let( ca = togunits1_to_ca(what, dbgctxstr=dbgctxstr) )
	let( xf1 = togunits1__get_transform(xf) )
	xf1(togridlib3_decode(ca, unit=togunits1_to_ca(unit), dbgctxstr=dbgctxstr));

function togunits1_decode_vec(whats, unit=[1,"mm"], xf=undef) =
	let( unit_ca = togunits1_to_ca(unit) )
	let( xf1 = togunits1__get_transform(xf) )
	[for(w=whats) xf1(togunits1_decode(w, unit_ca))];

function togunits1_to_mm(what, dbgctxstr=undef) = togunits1_decode(what, [1,"mm"], dbgctxstr=dbgctxstr);
function togunits1_vec_to_mms(what) = togunits1_decode_vec(what, [1,"mm"]);
// main file
// TwoPartPortLid1.1
// 
// Slots parallel to the edge of the circle
// so you can stack two and rotate them to get the
// width you want.

outer_diameter    = "1+3/32inch";
thickness         = "1/16inch";
slot_width        = "1/4inch";
slot_distance     = "1/4inch";
$fn = 48;

use <../lib/TOGUnits1.scad>
use <../lib/TOGMod1.scad>
use <../lib/TOGMod1Constructors.scad>
use <../lib/TOGPath1.scad>

thickness_mm = togunits1_to_mm(thickness);
outer_diameter_mm  = togunits1_to_mm(outer_diameter);
slot_width_mm      = togunits1_to_mm(slot_width);
slot_distance_mm   = togunits1_to_mm(slot_distance);

togmod1_domodule(
	let( r0 = slot_distance_mm - slot_width_mm/2 )
	let( r1 = slot_distance_mm + slot_width_mm/2 )
	let( r3 = outer_diameter_mm/2 )
	let( r4 = r3 + 100 )
	let( x0 = -slot_width_mm*129/256 )
	let( cr =  slot_width_mm*127/256 )
	togmod1_linear_extrude_z([-thickness_mm/2, thickness_mm/2], ["difference",
		togmod1_make_circle(d=outer_diameter_mm),
		
		togpath1_rath_to_polygon(["togpath1-rath",
			["togpath1-rathnode", [ r0, x0], ["round", cr]],
			["togpath1-rathnode", [ r1, x0], ["round", cr]],
			["togpath1-rathnode", [ r1, r1], ["round", r1]],
			["togpath1-rathnode", [-r1, r1], ["round", r1]],
			["togpath1-rathnode", [-r1, x0], ["round", cr]],
			["togpath1-rathnode", [-r0, x0], ["round", cr]],
			["togpath1-rathnode", [-r0, r0], ["round", r0]],
			["togpath1-rathnode", [ r0, r0], ["round", r0]],
		]),
		// Ugh, I should learn to make nice curves.
		["translate", [0,(r1+r3)/2], togmod1_make_rect([slot_width_mm, (r3-r1)*2])],
	])
);
